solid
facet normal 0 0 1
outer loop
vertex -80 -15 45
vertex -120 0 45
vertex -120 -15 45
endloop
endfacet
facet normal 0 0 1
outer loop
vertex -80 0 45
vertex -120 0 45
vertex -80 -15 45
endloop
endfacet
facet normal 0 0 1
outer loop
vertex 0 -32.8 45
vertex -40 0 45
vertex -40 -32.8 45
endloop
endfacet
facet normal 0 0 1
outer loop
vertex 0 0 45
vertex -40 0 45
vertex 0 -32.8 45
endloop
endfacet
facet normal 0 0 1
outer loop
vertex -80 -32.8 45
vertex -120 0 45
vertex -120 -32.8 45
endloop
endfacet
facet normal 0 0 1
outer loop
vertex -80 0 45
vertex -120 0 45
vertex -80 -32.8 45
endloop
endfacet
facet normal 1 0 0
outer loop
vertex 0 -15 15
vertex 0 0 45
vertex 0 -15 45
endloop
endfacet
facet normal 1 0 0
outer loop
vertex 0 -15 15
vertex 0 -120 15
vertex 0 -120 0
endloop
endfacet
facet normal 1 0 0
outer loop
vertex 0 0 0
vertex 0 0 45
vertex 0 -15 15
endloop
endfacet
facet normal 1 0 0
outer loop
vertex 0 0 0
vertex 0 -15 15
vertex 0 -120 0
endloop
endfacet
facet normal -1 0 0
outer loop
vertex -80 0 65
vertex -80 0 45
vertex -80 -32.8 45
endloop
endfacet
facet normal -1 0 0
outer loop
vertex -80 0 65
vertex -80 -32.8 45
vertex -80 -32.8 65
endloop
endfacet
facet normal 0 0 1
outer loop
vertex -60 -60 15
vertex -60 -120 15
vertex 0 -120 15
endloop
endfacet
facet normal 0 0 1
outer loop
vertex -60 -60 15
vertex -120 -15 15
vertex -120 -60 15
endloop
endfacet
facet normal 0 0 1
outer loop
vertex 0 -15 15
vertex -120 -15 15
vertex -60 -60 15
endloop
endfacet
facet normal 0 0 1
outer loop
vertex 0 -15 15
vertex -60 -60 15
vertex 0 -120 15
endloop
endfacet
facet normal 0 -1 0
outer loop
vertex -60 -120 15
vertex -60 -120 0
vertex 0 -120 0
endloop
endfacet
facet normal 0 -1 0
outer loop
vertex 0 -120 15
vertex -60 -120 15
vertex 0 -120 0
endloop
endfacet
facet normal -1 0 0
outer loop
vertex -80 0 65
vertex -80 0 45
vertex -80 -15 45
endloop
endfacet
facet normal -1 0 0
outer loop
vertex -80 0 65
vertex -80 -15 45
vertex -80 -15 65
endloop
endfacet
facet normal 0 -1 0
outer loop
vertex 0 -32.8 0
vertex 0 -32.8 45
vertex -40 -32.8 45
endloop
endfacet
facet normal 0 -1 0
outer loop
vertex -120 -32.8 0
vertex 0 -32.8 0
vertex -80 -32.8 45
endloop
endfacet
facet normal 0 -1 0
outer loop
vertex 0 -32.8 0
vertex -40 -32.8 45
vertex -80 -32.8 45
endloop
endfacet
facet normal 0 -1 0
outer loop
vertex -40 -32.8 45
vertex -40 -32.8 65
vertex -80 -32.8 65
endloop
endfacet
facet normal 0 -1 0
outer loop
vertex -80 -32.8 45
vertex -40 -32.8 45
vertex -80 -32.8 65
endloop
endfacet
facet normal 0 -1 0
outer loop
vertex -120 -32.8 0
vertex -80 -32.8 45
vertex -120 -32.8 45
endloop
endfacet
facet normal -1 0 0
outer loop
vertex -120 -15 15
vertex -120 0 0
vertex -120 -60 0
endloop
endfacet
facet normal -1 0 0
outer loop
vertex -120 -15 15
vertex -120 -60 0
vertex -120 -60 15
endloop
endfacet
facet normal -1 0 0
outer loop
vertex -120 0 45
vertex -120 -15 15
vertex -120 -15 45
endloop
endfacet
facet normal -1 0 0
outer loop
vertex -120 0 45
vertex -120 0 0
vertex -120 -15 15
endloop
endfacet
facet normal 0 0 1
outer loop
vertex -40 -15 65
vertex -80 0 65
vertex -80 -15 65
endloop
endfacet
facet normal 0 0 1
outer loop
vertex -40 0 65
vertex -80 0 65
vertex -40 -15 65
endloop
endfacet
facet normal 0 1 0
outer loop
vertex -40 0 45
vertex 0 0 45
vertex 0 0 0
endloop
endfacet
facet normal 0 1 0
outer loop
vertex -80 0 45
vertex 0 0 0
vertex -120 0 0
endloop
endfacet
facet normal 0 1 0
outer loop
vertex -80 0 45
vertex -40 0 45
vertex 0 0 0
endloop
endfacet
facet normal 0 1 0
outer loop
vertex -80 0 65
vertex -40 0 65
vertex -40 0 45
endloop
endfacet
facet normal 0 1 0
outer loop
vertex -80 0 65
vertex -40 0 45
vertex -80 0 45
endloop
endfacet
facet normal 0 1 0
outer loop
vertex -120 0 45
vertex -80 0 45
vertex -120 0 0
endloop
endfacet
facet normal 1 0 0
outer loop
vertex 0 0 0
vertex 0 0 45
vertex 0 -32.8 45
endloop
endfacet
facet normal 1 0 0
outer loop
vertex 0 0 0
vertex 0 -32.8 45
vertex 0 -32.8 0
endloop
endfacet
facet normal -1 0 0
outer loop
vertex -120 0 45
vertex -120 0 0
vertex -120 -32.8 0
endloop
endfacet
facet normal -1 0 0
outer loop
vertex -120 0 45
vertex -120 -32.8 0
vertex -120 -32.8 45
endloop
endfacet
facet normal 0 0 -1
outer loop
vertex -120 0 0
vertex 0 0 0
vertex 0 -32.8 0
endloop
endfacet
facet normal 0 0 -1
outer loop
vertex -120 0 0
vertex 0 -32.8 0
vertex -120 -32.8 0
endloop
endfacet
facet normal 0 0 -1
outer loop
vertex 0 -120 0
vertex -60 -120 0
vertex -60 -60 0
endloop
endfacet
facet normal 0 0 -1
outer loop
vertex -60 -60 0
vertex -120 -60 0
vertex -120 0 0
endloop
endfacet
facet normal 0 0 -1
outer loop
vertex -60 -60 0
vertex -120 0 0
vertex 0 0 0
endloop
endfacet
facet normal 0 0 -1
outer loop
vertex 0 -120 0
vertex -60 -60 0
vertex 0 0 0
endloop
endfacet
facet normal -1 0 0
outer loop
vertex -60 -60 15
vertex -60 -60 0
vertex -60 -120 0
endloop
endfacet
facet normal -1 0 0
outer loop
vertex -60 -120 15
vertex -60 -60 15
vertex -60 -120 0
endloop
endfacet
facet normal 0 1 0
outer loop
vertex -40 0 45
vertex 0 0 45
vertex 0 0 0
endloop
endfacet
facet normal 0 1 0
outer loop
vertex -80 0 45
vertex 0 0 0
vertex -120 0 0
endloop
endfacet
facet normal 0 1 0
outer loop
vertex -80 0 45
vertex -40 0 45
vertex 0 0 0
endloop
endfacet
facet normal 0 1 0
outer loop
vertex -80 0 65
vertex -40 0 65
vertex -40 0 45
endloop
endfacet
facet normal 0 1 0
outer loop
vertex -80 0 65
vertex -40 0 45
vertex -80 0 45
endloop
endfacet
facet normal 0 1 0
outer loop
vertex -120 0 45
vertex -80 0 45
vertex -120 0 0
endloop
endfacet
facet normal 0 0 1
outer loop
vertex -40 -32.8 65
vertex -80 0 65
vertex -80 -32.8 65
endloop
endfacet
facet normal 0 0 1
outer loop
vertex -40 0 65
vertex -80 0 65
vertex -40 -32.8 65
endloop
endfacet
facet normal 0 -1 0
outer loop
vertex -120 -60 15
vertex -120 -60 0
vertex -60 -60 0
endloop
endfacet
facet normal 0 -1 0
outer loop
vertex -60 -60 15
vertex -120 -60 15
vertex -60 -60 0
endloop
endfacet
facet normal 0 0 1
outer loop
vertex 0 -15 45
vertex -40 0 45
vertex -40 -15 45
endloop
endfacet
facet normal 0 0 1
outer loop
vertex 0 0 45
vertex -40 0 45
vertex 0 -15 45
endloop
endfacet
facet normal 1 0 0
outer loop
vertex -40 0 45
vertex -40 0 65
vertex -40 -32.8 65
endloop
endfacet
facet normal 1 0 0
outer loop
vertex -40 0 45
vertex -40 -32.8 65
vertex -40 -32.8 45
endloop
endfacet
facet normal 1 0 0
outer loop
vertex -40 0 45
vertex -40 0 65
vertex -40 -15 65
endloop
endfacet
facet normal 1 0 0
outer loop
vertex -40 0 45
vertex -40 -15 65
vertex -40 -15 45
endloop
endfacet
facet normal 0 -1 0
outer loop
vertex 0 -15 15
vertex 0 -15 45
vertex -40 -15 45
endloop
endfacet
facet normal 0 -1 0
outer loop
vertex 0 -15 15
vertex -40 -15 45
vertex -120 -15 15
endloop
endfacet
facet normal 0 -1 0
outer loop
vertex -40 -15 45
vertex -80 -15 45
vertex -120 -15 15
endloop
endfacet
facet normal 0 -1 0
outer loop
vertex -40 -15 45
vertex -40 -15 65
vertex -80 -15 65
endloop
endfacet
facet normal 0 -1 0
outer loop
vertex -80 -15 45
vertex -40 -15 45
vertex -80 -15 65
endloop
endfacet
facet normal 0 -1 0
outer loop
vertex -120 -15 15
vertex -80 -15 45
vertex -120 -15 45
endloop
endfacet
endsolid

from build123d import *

# Parameters (mm, degrees)
F1_DEPTH = 15
F3_DEPTH = 15
F5_DEPTH = 32.8


with BuildPart() as f1:
    # F0 (on Top) → F1 (new body)
    with BuildSketch(Plane.XY):
        Polygon((0, -120), (0, 0), (-120, 0), (-120, -60), (-60, -60), (-60, -120), align=None)
    extrude(amount=F1_DEPTH)

    # F2 (on face) → F3 (join)
    with BuildSketch(Plane(origin=(0, 0, 0), x_dir=(-1, 0, 0), z_dir=(0, 1, 0))):
        Polygon((0, 45), (0, 15), (120, 15), (120, 45), (80, 45), (80, 65), (40, 65), (40, 45), align=None)
    extrude(amount=-F3_DEPTH)


with BuildPart() as f5:
    # F4 (on face) → F5 (new body)
    with BuildSketch(Plane(origin=(0, 0, 0), x_dir=(-1, 0, 0), z_dir=(0, 1, 0))):
        Polygon((0, 45), (0, 0), (120, 0), (120, 45), (80, 45), (80, 65), (40, 65), (40, 45), align=None)
    extrude(amount=-F5_DEPTH)


solid = Compound([f1.part, f5.part])
